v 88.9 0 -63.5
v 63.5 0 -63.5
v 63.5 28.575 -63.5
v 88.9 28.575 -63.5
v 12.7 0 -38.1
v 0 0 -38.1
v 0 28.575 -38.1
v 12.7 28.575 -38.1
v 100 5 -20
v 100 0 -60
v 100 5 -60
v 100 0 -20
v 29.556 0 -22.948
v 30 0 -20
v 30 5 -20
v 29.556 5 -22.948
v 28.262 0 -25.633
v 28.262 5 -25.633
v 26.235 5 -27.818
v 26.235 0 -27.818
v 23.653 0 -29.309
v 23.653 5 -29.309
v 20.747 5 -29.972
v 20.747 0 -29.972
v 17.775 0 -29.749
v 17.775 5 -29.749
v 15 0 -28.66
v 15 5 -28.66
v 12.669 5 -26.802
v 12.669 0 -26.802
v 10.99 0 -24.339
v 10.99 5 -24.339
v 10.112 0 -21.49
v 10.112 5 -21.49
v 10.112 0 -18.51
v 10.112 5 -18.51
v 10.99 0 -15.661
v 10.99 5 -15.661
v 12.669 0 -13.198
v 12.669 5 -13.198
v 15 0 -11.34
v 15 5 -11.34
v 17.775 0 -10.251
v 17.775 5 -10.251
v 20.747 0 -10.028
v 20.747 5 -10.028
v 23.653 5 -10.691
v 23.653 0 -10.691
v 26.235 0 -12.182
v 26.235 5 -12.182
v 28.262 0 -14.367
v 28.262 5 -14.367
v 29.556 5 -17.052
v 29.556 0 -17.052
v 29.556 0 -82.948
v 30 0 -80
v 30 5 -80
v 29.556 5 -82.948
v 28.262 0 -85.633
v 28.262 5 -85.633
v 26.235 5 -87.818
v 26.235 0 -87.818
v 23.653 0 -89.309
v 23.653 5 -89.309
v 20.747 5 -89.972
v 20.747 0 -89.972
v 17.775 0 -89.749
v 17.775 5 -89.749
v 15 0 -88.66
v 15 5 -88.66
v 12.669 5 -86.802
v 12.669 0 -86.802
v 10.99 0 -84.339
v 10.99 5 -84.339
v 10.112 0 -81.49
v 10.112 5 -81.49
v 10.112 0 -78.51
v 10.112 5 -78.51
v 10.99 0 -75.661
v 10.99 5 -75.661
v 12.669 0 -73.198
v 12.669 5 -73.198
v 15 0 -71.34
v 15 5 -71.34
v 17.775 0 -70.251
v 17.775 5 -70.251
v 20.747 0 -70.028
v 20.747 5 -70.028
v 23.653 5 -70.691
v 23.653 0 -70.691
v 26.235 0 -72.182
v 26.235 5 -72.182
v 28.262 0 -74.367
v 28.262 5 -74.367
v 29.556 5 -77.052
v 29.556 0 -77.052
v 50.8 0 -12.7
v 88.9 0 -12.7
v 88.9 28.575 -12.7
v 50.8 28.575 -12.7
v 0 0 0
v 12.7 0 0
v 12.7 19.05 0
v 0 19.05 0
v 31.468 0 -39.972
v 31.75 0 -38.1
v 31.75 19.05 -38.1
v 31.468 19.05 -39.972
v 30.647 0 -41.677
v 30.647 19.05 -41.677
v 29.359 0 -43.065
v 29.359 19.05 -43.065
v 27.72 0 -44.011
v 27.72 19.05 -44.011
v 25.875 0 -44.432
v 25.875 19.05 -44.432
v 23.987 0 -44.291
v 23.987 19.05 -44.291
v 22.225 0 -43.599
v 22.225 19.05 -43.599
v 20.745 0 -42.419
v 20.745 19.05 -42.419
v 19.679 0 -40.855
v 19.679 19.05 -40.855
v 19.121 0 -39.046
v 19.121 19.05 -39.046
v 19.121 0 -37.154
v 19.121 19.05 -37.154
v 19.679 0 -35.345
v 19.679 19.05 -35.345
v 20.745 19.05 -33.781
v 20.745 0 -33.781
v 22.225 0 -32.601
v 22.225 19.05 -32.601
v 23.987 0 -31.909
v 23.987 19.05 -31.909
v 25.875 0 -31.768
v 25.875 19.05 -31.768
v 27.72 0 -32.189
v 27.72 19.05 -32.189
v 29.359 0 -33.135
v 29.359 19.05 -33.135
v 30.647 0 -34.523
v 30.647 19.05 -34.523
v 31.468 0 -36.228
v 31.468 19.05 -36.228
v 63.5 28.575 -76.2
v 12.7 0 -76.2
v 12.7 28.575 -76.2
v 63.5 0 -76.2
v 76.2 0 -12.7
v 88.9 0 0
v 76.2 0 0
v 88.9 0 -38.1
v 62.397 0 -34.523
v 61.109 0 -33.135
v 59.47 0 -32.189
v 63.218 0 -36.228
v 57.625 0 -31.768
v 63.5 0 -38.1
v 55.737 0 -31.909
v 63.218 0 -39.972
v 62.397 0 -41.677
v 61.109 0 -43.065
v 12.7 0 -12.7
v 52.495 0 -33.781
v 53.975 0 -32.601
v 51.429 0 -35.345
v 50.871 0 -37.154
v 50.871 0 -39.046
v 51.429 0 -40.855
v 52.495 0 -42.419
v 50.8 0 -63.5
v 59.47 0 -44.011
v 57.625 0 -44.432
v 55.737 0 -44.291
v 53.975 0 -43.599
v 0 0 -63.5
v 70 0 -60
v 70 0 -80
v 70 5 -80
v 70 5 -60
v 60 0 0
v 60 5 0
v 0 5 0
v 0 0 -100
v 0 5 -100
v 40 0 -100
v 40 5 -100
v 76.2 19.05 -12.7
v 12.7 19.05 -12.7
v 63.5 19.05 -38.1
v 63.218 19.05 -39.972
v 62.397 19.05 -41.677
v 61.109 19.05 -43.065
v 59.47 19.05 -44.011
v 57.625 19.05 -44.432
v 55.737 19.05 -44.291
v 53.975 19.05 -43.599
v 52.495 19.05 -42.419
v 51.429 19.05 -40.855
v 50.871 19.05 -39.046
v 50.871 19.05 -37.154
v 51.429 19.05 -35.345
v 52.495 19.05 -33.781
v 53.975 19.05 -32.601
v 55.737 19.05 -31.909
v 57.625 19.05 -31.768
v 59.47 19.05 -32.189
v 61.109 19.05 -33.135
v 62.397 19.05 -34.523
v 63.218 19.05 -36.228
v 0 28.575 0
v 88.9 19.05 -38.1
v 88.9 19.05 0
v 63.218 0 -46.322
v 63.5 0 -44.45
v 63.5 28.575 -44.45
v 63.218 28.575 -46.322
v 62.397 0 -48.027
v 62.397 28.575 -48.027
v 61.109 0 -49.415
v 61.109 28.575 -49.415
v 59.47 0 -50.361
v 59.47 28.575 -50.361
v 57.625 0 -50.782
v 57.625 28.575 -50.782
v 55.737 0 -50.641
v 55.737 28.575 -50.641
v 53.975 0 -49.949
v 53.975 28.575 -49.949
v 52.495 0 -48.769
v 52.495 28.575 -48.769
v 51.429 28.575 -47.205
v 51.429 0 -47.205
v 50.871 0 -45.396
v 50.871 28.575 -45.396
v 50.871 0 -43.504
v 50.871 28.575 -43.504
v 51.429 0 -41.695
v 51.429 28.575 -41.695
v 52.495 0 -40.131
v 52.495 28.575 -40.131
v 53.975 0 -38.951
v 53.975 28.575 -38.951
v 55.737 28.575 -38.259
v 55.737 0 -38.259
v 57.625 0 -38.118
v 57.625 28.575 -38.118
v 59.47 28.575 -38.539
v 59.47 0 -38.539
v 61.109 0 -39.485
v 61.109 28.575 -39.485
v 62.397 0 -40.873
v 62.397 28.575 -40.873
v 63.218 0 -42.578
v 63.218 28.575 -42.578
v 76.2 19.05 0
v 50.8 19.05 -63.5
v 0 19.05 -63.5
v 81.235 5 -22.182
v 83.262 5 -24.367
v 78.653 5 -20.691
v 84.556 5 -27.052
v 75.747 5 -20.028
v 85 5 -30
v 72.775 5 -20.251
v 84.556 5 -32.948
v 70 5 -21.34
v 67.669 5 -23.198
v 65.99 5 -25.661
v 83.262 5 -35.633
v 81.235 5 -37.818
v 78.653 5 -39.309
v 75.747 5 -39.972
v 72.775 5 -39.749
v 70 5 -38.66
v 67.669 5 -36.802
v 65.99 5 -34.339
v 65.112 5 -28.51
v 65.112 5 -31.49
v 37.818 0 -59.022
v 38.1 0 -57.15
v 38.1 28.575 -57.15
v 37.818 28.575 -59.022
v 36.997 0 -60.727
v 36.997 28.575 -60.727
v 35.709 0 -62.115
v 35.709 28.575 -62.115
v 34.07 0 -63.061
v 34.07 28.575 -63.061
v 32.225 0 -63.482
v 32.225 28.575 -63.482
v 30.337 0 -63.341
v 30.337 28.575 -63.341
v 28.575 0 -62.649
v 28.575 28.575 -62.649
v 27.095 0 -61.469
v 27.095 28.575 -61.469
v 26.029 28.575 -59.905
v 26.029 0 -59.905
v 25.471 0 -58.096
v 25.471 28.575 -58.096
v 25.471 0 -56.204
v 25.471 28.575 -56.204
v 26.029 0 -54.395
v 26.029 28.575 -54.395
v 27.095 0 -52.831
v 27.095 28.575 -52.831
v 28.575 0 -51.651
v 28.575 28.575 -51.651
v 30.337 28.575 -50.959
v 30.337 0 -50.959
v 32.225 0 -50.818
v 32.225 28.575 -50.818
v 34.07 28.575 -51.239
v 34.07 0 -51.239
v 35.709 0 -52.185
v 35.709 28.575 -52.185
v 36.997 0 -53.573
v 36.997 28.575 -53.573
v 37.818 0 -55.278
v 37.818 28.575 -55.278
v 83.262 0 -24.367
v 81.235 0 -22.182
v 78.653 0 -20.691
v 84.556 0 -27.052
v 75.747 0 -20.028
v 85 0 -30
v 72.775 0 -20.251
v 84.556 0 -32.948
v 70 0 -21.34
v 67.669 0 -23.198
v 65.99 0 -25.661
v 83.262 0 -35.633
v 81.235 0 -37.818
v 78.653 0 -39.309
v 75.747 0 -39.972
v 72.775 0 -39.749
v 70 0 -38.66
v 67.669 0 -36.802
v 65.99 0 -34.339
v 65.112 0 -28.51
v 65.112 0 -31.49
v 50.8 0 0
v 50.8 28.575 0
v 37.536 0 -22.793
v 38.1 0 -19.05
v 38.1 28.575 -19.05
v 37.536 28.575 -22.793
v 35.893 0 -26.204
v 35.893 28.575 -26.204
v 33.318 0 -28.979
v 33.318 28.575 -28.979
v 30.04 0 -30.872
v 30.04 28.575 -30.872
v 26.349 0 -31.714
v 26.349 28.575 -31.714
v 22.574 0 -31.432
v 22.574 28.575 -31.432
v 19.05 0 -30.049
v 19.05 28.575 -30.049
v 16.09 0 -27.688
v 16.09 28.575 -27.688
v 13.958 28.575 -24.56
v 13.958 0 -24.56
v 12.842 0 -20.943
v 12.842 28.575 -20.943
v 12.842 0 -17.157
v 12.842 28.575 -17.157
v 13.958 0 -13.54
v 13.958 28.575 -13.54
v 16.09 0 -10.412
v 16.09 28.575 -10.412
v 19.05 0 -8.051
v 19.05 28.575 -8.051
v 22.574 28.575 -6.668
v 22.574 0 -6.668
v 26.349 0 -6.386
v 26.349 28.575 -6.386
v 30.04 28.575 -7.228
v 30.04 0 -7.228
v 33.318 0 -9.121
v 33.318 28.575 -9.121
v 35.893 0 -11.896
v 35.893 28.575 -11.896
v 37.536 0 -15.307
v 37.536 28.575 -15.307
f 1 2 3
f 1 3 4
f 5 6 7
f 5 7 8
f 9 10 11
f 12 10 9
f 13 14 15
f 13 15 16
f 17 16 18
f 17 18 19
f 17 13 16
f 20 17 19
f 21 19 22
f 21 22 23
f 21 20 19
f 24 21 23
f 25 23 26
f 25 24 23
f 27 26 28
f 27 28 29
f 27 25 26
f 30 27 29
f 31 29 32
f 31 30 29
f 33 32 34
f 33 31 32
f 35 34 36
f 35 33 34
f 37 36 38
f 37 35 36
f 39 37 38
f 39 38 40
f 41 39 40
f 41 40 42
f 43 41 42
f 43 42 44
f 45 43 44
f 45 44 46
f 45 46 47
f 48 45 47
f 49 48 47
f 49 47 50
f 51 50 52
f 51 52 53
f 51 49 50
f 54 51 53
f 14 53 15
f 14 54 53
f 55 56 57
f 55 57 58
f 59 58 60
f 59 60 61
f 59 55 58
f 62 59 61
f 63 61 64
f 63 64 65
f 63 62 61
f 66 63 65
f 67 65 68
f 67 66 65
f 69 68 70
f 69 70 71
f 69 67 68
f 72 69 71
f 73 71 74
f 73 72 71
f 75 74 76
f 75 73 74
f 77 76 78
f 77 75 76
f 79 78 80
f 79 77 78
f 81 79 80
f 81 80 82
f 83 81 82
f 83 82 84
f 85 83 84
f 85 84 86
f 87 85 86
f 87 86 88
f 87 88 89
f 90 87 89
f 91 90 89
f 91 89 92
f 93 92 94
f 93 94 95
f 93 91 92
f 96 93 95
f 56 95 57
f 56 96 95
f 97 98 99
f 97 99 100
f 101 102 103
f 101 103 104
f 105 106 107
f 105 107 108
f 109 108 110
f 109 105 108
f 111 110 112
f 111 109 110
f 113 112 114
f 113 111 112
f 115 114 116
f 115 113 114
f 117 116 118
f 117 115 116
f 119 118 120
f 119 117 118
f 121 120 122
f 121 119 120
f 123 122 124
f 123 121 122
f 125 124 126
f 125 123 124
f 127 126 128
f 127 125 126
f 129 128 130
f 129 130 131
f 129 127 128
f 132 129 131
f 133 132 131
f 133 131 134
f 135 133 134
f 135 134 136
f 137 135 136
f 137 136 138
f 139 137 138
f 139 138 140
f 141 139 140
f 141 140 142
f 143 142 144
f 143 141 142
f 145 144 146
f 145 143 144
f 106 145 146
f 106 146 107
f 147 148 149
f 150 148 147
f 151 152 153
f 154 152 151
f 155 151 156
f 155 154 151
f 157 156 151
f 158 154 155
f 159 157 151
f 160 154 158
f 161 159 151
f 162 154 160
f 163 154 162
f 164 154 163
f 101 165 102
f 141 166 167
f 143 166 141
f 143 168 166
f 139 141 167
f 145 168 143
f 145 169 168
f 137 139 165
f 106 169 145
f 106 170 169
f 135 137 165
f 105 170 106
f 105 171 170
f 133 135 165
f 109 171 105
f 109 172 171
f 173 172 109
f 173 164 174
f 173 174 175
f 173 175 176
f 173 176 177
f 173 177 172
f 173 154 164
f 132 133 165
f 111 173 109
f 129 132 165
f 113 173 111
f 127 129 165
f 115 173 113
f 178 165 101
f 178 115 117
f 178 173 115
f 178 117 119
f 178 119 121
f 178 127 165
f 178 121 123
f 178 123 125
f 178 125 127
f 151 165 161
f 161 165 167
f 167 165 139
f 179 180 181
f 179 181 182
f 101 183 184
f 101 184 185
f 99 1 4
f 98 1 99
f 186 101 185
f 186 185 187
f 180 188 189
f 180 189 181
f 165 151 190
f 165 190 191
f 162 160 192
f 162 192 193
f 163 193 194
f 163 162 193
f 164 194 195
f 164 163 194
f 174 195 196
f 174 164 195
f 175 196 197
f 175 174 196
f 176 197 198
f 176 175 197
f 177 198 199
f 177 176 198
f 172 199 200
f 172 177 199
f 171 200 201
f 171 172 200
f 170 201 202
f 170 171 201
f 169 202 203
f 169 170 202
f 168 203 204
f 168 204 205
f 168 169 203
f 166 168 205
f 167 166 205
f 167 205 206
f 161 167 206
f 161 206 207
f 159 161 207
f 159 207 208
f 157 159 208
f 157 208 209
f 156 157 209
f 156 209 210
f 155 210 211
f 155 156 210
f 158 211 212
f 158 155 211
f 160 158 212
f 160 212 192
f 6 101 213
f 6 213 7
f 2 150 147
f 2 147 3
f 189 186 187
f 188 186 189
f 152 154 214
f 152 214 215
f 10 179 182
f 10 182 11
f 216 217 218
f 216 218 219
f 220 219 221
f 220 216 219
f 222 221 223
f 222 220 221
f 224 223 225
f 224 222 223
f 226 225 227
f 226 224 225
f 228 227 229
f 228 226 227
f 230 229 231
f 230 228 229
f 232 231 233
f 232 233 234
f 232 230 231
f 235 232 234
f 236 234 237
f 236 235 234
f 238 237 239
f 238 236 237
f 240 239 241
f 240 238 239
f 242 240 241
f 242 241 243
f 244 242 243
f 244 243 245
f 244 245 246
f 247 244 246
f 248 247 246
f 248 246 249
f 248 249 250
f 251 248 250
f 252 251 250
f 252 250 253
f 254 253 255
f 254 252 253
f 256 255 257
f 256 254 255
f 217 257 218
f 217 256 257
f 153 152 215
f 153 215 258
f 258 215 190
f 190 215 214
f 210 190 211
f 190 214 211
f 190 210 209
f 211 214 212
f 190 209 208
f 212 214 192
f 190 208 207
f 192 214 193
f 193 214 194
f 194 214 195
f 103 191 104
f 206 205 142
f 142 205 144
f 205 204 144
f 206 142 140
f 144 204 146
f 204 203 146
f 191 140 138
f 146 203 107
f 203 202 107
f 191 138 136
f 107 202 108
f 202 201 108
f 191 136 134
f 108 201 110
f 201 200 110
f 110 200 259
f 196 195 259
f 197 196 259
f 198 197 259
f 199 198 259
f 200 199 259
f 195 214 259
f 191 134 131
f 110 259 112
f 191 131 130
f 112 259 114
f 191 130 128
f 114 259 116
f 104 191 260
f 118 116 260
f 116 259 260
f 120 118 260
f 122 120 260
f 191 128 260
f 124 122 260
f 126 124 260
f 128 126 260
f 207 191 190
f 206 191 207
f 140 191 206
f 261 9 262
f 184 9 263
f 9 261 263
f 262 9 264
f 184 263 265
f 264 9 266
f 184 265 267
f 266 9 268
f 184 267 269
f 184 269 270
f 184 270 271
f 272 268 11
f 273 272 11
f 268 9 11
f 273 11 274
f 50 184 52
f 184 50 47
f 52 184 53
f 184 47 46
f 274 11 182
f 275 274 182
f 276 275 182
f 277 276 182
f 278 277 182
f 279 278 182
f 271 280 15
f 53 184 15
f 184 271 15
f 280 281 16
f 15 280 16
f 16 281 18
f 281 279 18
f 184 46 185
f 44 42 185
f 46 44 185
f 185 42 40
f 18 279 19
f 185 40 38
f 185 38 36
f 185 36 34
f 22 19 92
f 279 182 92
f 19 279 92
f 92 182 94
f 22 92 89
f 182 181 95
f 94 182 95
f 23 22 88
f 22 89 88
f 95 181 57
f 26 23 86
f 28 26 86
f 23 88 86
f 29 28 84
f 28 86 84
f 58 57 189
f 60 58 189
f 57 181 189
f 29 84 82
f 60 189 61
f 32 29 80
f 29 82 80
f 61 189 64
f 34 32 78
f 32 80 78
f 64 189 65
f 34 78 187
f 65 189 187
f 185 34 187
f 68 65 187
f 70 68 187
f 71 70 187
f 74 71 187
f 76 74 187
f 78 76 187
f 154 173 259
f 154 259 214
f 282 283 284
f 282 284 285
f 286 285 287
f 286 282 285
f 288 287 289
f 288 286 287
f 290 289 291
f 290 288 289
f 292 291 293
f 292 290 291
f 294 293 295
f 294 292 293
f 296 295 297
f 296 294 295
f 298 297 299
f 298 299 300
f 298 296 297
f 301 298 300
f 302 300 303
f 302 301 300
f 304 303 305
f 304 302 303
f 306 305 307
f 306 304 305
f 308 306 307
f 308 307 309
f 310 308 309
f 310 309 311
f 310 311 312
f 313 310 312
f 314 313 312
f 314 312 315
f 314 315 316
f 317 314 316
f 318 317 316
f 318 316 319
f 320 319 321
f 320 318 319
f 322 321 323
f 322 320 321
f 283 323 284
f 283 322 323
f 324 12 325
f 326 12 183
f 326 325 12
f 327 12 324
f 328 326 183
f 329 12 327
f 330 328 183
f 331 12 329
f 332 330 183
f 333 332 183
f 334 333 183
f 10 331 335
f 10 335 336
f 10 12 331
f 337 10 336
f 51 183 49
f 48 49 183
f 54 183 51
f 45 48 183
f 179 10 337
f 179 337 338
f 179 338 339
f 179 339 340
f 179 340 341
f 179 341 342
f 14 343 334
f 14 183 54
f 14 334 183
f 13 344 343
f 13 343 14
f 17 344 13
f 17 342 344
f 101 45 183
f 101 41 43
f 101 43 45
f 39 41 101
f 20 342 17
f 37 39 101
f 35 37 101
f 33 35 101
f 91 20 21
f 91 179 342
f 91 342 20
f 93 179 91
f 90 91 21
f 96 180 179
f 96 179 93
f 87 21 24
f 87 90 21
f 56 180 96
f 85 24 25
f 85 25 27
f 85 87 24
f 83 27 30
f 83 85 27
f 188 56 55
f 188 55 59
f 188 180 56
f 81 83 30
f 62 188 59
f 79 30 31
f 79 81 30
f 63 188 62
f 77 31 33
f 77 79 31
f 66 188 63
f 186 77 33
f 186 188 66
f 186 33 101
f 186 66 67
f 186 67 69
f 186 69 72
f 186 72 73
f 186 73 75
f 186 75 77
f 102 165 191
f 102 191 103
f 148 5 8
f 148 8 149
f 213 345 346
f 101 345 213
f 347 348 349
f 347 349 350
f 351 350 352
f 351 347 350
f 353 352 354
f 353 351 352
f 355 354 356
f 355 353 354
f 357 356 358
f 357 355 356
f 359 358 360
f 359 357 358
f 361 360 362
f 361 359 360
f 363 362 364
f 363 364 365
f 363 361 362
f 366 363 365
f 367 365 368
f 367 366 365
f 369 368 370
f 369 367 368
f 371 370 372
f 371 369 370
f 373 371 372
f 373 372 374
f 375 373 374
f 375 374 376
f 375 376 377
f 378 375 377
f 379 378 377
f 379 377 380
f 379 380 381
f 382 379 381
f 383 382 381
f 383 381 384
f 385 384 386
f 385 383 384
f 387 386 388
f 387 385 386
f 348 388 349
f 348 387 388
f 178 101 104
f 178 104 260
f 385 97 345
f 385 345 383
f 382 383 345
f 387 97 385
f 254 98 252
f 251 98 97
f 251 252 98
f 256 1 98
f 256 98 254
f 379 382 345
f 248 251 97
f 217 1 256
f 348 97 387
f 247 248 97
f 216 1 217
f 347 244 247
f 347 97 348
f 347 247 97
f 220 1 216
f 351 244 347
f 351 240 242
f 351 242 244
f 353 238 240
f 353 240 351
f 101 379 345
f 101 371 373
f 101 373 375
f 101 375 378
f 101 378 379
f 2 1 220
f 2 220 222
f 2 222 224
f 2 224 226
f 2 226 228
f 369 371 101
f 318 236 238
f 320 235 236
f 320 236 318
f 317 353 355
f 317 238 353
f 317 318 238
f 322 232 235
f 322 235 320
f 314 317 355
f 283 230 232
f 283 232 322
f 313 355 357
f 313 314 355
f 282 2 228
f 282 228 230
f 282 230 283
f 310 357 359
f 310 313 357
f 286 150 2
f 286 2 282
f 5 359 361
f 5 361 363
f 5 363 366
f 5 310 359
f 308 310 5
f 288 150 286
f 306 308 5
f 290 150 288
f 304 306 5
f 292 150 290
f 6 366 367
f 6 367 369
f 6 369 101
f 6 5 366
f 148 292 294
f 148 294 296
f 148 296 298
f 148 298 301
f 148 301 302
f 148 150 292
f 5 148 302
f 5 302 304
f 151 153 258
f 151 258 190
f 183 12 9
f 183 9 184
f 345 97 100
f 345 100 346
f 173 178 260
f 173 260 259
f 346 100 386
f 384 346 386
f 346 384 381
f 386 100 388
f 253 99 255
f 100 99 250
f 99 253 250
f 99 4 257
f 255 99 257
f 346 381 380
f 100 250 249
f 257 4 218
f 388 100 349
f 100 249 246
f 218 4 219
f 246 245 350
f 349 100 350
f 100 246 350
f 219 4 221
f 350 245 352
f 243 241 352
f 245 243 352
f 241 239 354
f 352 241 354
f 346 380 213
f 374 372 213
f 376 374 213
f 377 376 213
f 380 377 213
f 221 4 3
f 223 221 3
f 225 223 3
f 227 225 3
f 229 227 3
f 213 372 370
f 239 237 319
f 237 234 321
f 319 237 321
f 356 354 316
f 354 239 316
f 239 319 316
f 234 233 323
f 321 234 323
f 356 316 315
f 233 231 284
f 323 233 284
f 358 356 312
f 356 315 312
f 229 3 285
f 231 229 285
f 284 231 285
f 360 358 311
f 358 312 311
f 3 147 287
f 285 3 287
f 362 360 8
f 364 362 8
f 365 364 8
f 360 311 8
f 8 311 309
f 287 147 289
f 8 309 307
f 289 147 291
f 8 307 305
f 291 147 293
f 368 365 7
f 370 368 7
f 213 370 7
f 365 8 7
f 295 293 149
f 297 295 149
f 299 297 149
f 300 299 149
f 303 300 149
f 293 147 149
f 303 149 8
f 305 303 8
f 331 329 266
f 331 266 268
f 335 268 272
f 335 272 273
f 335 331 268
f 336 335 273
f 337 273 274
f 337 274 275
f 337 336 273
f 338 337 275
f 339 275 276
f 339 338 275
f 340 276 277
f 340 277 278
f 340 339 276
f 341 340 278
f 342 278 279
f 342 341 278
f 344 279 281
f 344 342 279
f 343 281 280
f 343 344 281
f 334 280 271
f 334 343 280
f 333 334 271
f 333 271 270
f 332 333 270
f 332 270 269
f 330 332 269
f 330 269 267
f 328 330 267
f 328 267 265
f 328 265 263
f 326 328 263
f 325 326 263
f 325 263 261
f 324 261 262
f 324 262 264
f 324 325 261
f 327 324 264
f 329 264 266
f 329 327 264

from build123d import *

# Parameters (mm, degrees)
SKETCH2_R           = 6.35
BOSS_EXTRUDE1_DEPTH = 19.05
SKETCH3_R           = 12.7
SKETCH3_R_2         = 6.35
BOSS_EXTRUDE2_DEPTH = 28.575
SKETCH5_R           = 10
BOSS_EXTRUDE3_DEPTH = 5


with BuildPart() as part:
    # Sketch2 → Boss-Extrude1 (new body)
    with BuildSketch(Plane(origin=(0, 0, 0), x_dir=(1, 0, 0), z_dir=(0, 1, 0))):
        Polygon((0, 0), (0, 63.5), (50.8, 63.5), (88.9, 38.1), (88.9, 0), (76.2, 0), (76.2, 12.7), (12.7, 12.7), (12.7, 0), align=None)
        with Locations((25.4, 38.1)):
            Circle(SKETCH2_R, mode=Mode.SUBTRACT)
        with Locations((57.15, 38.1)):
            Circle(SKETCH2_R, mode=Mode.SUBTRACT)
    extrude(amount=BOSS_EXTRUDE1_DEPTH)


with BuildPart() as body_2:
    # Sketch3 → Boss-Extrude2 (new body)
    with BuildSketch(Plane(origin=(0, 0, 0), x_dir=(1, 0, 0), z_dir=(0, 1, 0))):
        Polygon((0, 0), (0, 38.1), (12.7, 38.1), (12.7, 76.2), (63.5, 76.2), (63.5, 63.5), (88.9, 63.5), (88.9, 12.7), (50.8, 12.7), (50.8, 0), align=None)
        with Locations((25.4, 19.05)):
            Circle(SKETCH3_R, mode=Mode.SUBTRACT)
        with Locations((31.75, 57.15)):
            Circle(SKETCH3_R_2, mode=Mode.SUBTRACT)
        with Locations((57.15, 44.45)):
            Circle(SKETCH3_R_2, mode=Mode.SUBTRACT)
    extrude(amount=BOSS_EXTRUDE2_DEPTH)


with BuildPart() as body_3:
    # Sketch5 → Boss-Extrude3 (new body)
    with BuildSketch(Plane(origin=(0, 0, 0), x_dir=(1, 0, 0), z_dir=(0, 1, 0))):
        Polygon((0, 0), (0, 100), (40, 100), (70, 80), (70, 60), (100, 60), (100, 20), (60, 0), align=None)
        with Locations((20, 80)):
            Circle(SKETCH5_R, mode=Mode.SUBTRACT)
        with Locations((20, 20)):
            Circle(SKETCH5_R, mode=Mode.SUBTRACT)
        with Locations((75, 30)):
            Circle(SKETCH5_R, mode=Mode.SUBTRACT)
    extrude(amount=BOSS_EXTRUDE3_DEPTH)


solid = Compound([part.part, body_2.part, body_3.part])
